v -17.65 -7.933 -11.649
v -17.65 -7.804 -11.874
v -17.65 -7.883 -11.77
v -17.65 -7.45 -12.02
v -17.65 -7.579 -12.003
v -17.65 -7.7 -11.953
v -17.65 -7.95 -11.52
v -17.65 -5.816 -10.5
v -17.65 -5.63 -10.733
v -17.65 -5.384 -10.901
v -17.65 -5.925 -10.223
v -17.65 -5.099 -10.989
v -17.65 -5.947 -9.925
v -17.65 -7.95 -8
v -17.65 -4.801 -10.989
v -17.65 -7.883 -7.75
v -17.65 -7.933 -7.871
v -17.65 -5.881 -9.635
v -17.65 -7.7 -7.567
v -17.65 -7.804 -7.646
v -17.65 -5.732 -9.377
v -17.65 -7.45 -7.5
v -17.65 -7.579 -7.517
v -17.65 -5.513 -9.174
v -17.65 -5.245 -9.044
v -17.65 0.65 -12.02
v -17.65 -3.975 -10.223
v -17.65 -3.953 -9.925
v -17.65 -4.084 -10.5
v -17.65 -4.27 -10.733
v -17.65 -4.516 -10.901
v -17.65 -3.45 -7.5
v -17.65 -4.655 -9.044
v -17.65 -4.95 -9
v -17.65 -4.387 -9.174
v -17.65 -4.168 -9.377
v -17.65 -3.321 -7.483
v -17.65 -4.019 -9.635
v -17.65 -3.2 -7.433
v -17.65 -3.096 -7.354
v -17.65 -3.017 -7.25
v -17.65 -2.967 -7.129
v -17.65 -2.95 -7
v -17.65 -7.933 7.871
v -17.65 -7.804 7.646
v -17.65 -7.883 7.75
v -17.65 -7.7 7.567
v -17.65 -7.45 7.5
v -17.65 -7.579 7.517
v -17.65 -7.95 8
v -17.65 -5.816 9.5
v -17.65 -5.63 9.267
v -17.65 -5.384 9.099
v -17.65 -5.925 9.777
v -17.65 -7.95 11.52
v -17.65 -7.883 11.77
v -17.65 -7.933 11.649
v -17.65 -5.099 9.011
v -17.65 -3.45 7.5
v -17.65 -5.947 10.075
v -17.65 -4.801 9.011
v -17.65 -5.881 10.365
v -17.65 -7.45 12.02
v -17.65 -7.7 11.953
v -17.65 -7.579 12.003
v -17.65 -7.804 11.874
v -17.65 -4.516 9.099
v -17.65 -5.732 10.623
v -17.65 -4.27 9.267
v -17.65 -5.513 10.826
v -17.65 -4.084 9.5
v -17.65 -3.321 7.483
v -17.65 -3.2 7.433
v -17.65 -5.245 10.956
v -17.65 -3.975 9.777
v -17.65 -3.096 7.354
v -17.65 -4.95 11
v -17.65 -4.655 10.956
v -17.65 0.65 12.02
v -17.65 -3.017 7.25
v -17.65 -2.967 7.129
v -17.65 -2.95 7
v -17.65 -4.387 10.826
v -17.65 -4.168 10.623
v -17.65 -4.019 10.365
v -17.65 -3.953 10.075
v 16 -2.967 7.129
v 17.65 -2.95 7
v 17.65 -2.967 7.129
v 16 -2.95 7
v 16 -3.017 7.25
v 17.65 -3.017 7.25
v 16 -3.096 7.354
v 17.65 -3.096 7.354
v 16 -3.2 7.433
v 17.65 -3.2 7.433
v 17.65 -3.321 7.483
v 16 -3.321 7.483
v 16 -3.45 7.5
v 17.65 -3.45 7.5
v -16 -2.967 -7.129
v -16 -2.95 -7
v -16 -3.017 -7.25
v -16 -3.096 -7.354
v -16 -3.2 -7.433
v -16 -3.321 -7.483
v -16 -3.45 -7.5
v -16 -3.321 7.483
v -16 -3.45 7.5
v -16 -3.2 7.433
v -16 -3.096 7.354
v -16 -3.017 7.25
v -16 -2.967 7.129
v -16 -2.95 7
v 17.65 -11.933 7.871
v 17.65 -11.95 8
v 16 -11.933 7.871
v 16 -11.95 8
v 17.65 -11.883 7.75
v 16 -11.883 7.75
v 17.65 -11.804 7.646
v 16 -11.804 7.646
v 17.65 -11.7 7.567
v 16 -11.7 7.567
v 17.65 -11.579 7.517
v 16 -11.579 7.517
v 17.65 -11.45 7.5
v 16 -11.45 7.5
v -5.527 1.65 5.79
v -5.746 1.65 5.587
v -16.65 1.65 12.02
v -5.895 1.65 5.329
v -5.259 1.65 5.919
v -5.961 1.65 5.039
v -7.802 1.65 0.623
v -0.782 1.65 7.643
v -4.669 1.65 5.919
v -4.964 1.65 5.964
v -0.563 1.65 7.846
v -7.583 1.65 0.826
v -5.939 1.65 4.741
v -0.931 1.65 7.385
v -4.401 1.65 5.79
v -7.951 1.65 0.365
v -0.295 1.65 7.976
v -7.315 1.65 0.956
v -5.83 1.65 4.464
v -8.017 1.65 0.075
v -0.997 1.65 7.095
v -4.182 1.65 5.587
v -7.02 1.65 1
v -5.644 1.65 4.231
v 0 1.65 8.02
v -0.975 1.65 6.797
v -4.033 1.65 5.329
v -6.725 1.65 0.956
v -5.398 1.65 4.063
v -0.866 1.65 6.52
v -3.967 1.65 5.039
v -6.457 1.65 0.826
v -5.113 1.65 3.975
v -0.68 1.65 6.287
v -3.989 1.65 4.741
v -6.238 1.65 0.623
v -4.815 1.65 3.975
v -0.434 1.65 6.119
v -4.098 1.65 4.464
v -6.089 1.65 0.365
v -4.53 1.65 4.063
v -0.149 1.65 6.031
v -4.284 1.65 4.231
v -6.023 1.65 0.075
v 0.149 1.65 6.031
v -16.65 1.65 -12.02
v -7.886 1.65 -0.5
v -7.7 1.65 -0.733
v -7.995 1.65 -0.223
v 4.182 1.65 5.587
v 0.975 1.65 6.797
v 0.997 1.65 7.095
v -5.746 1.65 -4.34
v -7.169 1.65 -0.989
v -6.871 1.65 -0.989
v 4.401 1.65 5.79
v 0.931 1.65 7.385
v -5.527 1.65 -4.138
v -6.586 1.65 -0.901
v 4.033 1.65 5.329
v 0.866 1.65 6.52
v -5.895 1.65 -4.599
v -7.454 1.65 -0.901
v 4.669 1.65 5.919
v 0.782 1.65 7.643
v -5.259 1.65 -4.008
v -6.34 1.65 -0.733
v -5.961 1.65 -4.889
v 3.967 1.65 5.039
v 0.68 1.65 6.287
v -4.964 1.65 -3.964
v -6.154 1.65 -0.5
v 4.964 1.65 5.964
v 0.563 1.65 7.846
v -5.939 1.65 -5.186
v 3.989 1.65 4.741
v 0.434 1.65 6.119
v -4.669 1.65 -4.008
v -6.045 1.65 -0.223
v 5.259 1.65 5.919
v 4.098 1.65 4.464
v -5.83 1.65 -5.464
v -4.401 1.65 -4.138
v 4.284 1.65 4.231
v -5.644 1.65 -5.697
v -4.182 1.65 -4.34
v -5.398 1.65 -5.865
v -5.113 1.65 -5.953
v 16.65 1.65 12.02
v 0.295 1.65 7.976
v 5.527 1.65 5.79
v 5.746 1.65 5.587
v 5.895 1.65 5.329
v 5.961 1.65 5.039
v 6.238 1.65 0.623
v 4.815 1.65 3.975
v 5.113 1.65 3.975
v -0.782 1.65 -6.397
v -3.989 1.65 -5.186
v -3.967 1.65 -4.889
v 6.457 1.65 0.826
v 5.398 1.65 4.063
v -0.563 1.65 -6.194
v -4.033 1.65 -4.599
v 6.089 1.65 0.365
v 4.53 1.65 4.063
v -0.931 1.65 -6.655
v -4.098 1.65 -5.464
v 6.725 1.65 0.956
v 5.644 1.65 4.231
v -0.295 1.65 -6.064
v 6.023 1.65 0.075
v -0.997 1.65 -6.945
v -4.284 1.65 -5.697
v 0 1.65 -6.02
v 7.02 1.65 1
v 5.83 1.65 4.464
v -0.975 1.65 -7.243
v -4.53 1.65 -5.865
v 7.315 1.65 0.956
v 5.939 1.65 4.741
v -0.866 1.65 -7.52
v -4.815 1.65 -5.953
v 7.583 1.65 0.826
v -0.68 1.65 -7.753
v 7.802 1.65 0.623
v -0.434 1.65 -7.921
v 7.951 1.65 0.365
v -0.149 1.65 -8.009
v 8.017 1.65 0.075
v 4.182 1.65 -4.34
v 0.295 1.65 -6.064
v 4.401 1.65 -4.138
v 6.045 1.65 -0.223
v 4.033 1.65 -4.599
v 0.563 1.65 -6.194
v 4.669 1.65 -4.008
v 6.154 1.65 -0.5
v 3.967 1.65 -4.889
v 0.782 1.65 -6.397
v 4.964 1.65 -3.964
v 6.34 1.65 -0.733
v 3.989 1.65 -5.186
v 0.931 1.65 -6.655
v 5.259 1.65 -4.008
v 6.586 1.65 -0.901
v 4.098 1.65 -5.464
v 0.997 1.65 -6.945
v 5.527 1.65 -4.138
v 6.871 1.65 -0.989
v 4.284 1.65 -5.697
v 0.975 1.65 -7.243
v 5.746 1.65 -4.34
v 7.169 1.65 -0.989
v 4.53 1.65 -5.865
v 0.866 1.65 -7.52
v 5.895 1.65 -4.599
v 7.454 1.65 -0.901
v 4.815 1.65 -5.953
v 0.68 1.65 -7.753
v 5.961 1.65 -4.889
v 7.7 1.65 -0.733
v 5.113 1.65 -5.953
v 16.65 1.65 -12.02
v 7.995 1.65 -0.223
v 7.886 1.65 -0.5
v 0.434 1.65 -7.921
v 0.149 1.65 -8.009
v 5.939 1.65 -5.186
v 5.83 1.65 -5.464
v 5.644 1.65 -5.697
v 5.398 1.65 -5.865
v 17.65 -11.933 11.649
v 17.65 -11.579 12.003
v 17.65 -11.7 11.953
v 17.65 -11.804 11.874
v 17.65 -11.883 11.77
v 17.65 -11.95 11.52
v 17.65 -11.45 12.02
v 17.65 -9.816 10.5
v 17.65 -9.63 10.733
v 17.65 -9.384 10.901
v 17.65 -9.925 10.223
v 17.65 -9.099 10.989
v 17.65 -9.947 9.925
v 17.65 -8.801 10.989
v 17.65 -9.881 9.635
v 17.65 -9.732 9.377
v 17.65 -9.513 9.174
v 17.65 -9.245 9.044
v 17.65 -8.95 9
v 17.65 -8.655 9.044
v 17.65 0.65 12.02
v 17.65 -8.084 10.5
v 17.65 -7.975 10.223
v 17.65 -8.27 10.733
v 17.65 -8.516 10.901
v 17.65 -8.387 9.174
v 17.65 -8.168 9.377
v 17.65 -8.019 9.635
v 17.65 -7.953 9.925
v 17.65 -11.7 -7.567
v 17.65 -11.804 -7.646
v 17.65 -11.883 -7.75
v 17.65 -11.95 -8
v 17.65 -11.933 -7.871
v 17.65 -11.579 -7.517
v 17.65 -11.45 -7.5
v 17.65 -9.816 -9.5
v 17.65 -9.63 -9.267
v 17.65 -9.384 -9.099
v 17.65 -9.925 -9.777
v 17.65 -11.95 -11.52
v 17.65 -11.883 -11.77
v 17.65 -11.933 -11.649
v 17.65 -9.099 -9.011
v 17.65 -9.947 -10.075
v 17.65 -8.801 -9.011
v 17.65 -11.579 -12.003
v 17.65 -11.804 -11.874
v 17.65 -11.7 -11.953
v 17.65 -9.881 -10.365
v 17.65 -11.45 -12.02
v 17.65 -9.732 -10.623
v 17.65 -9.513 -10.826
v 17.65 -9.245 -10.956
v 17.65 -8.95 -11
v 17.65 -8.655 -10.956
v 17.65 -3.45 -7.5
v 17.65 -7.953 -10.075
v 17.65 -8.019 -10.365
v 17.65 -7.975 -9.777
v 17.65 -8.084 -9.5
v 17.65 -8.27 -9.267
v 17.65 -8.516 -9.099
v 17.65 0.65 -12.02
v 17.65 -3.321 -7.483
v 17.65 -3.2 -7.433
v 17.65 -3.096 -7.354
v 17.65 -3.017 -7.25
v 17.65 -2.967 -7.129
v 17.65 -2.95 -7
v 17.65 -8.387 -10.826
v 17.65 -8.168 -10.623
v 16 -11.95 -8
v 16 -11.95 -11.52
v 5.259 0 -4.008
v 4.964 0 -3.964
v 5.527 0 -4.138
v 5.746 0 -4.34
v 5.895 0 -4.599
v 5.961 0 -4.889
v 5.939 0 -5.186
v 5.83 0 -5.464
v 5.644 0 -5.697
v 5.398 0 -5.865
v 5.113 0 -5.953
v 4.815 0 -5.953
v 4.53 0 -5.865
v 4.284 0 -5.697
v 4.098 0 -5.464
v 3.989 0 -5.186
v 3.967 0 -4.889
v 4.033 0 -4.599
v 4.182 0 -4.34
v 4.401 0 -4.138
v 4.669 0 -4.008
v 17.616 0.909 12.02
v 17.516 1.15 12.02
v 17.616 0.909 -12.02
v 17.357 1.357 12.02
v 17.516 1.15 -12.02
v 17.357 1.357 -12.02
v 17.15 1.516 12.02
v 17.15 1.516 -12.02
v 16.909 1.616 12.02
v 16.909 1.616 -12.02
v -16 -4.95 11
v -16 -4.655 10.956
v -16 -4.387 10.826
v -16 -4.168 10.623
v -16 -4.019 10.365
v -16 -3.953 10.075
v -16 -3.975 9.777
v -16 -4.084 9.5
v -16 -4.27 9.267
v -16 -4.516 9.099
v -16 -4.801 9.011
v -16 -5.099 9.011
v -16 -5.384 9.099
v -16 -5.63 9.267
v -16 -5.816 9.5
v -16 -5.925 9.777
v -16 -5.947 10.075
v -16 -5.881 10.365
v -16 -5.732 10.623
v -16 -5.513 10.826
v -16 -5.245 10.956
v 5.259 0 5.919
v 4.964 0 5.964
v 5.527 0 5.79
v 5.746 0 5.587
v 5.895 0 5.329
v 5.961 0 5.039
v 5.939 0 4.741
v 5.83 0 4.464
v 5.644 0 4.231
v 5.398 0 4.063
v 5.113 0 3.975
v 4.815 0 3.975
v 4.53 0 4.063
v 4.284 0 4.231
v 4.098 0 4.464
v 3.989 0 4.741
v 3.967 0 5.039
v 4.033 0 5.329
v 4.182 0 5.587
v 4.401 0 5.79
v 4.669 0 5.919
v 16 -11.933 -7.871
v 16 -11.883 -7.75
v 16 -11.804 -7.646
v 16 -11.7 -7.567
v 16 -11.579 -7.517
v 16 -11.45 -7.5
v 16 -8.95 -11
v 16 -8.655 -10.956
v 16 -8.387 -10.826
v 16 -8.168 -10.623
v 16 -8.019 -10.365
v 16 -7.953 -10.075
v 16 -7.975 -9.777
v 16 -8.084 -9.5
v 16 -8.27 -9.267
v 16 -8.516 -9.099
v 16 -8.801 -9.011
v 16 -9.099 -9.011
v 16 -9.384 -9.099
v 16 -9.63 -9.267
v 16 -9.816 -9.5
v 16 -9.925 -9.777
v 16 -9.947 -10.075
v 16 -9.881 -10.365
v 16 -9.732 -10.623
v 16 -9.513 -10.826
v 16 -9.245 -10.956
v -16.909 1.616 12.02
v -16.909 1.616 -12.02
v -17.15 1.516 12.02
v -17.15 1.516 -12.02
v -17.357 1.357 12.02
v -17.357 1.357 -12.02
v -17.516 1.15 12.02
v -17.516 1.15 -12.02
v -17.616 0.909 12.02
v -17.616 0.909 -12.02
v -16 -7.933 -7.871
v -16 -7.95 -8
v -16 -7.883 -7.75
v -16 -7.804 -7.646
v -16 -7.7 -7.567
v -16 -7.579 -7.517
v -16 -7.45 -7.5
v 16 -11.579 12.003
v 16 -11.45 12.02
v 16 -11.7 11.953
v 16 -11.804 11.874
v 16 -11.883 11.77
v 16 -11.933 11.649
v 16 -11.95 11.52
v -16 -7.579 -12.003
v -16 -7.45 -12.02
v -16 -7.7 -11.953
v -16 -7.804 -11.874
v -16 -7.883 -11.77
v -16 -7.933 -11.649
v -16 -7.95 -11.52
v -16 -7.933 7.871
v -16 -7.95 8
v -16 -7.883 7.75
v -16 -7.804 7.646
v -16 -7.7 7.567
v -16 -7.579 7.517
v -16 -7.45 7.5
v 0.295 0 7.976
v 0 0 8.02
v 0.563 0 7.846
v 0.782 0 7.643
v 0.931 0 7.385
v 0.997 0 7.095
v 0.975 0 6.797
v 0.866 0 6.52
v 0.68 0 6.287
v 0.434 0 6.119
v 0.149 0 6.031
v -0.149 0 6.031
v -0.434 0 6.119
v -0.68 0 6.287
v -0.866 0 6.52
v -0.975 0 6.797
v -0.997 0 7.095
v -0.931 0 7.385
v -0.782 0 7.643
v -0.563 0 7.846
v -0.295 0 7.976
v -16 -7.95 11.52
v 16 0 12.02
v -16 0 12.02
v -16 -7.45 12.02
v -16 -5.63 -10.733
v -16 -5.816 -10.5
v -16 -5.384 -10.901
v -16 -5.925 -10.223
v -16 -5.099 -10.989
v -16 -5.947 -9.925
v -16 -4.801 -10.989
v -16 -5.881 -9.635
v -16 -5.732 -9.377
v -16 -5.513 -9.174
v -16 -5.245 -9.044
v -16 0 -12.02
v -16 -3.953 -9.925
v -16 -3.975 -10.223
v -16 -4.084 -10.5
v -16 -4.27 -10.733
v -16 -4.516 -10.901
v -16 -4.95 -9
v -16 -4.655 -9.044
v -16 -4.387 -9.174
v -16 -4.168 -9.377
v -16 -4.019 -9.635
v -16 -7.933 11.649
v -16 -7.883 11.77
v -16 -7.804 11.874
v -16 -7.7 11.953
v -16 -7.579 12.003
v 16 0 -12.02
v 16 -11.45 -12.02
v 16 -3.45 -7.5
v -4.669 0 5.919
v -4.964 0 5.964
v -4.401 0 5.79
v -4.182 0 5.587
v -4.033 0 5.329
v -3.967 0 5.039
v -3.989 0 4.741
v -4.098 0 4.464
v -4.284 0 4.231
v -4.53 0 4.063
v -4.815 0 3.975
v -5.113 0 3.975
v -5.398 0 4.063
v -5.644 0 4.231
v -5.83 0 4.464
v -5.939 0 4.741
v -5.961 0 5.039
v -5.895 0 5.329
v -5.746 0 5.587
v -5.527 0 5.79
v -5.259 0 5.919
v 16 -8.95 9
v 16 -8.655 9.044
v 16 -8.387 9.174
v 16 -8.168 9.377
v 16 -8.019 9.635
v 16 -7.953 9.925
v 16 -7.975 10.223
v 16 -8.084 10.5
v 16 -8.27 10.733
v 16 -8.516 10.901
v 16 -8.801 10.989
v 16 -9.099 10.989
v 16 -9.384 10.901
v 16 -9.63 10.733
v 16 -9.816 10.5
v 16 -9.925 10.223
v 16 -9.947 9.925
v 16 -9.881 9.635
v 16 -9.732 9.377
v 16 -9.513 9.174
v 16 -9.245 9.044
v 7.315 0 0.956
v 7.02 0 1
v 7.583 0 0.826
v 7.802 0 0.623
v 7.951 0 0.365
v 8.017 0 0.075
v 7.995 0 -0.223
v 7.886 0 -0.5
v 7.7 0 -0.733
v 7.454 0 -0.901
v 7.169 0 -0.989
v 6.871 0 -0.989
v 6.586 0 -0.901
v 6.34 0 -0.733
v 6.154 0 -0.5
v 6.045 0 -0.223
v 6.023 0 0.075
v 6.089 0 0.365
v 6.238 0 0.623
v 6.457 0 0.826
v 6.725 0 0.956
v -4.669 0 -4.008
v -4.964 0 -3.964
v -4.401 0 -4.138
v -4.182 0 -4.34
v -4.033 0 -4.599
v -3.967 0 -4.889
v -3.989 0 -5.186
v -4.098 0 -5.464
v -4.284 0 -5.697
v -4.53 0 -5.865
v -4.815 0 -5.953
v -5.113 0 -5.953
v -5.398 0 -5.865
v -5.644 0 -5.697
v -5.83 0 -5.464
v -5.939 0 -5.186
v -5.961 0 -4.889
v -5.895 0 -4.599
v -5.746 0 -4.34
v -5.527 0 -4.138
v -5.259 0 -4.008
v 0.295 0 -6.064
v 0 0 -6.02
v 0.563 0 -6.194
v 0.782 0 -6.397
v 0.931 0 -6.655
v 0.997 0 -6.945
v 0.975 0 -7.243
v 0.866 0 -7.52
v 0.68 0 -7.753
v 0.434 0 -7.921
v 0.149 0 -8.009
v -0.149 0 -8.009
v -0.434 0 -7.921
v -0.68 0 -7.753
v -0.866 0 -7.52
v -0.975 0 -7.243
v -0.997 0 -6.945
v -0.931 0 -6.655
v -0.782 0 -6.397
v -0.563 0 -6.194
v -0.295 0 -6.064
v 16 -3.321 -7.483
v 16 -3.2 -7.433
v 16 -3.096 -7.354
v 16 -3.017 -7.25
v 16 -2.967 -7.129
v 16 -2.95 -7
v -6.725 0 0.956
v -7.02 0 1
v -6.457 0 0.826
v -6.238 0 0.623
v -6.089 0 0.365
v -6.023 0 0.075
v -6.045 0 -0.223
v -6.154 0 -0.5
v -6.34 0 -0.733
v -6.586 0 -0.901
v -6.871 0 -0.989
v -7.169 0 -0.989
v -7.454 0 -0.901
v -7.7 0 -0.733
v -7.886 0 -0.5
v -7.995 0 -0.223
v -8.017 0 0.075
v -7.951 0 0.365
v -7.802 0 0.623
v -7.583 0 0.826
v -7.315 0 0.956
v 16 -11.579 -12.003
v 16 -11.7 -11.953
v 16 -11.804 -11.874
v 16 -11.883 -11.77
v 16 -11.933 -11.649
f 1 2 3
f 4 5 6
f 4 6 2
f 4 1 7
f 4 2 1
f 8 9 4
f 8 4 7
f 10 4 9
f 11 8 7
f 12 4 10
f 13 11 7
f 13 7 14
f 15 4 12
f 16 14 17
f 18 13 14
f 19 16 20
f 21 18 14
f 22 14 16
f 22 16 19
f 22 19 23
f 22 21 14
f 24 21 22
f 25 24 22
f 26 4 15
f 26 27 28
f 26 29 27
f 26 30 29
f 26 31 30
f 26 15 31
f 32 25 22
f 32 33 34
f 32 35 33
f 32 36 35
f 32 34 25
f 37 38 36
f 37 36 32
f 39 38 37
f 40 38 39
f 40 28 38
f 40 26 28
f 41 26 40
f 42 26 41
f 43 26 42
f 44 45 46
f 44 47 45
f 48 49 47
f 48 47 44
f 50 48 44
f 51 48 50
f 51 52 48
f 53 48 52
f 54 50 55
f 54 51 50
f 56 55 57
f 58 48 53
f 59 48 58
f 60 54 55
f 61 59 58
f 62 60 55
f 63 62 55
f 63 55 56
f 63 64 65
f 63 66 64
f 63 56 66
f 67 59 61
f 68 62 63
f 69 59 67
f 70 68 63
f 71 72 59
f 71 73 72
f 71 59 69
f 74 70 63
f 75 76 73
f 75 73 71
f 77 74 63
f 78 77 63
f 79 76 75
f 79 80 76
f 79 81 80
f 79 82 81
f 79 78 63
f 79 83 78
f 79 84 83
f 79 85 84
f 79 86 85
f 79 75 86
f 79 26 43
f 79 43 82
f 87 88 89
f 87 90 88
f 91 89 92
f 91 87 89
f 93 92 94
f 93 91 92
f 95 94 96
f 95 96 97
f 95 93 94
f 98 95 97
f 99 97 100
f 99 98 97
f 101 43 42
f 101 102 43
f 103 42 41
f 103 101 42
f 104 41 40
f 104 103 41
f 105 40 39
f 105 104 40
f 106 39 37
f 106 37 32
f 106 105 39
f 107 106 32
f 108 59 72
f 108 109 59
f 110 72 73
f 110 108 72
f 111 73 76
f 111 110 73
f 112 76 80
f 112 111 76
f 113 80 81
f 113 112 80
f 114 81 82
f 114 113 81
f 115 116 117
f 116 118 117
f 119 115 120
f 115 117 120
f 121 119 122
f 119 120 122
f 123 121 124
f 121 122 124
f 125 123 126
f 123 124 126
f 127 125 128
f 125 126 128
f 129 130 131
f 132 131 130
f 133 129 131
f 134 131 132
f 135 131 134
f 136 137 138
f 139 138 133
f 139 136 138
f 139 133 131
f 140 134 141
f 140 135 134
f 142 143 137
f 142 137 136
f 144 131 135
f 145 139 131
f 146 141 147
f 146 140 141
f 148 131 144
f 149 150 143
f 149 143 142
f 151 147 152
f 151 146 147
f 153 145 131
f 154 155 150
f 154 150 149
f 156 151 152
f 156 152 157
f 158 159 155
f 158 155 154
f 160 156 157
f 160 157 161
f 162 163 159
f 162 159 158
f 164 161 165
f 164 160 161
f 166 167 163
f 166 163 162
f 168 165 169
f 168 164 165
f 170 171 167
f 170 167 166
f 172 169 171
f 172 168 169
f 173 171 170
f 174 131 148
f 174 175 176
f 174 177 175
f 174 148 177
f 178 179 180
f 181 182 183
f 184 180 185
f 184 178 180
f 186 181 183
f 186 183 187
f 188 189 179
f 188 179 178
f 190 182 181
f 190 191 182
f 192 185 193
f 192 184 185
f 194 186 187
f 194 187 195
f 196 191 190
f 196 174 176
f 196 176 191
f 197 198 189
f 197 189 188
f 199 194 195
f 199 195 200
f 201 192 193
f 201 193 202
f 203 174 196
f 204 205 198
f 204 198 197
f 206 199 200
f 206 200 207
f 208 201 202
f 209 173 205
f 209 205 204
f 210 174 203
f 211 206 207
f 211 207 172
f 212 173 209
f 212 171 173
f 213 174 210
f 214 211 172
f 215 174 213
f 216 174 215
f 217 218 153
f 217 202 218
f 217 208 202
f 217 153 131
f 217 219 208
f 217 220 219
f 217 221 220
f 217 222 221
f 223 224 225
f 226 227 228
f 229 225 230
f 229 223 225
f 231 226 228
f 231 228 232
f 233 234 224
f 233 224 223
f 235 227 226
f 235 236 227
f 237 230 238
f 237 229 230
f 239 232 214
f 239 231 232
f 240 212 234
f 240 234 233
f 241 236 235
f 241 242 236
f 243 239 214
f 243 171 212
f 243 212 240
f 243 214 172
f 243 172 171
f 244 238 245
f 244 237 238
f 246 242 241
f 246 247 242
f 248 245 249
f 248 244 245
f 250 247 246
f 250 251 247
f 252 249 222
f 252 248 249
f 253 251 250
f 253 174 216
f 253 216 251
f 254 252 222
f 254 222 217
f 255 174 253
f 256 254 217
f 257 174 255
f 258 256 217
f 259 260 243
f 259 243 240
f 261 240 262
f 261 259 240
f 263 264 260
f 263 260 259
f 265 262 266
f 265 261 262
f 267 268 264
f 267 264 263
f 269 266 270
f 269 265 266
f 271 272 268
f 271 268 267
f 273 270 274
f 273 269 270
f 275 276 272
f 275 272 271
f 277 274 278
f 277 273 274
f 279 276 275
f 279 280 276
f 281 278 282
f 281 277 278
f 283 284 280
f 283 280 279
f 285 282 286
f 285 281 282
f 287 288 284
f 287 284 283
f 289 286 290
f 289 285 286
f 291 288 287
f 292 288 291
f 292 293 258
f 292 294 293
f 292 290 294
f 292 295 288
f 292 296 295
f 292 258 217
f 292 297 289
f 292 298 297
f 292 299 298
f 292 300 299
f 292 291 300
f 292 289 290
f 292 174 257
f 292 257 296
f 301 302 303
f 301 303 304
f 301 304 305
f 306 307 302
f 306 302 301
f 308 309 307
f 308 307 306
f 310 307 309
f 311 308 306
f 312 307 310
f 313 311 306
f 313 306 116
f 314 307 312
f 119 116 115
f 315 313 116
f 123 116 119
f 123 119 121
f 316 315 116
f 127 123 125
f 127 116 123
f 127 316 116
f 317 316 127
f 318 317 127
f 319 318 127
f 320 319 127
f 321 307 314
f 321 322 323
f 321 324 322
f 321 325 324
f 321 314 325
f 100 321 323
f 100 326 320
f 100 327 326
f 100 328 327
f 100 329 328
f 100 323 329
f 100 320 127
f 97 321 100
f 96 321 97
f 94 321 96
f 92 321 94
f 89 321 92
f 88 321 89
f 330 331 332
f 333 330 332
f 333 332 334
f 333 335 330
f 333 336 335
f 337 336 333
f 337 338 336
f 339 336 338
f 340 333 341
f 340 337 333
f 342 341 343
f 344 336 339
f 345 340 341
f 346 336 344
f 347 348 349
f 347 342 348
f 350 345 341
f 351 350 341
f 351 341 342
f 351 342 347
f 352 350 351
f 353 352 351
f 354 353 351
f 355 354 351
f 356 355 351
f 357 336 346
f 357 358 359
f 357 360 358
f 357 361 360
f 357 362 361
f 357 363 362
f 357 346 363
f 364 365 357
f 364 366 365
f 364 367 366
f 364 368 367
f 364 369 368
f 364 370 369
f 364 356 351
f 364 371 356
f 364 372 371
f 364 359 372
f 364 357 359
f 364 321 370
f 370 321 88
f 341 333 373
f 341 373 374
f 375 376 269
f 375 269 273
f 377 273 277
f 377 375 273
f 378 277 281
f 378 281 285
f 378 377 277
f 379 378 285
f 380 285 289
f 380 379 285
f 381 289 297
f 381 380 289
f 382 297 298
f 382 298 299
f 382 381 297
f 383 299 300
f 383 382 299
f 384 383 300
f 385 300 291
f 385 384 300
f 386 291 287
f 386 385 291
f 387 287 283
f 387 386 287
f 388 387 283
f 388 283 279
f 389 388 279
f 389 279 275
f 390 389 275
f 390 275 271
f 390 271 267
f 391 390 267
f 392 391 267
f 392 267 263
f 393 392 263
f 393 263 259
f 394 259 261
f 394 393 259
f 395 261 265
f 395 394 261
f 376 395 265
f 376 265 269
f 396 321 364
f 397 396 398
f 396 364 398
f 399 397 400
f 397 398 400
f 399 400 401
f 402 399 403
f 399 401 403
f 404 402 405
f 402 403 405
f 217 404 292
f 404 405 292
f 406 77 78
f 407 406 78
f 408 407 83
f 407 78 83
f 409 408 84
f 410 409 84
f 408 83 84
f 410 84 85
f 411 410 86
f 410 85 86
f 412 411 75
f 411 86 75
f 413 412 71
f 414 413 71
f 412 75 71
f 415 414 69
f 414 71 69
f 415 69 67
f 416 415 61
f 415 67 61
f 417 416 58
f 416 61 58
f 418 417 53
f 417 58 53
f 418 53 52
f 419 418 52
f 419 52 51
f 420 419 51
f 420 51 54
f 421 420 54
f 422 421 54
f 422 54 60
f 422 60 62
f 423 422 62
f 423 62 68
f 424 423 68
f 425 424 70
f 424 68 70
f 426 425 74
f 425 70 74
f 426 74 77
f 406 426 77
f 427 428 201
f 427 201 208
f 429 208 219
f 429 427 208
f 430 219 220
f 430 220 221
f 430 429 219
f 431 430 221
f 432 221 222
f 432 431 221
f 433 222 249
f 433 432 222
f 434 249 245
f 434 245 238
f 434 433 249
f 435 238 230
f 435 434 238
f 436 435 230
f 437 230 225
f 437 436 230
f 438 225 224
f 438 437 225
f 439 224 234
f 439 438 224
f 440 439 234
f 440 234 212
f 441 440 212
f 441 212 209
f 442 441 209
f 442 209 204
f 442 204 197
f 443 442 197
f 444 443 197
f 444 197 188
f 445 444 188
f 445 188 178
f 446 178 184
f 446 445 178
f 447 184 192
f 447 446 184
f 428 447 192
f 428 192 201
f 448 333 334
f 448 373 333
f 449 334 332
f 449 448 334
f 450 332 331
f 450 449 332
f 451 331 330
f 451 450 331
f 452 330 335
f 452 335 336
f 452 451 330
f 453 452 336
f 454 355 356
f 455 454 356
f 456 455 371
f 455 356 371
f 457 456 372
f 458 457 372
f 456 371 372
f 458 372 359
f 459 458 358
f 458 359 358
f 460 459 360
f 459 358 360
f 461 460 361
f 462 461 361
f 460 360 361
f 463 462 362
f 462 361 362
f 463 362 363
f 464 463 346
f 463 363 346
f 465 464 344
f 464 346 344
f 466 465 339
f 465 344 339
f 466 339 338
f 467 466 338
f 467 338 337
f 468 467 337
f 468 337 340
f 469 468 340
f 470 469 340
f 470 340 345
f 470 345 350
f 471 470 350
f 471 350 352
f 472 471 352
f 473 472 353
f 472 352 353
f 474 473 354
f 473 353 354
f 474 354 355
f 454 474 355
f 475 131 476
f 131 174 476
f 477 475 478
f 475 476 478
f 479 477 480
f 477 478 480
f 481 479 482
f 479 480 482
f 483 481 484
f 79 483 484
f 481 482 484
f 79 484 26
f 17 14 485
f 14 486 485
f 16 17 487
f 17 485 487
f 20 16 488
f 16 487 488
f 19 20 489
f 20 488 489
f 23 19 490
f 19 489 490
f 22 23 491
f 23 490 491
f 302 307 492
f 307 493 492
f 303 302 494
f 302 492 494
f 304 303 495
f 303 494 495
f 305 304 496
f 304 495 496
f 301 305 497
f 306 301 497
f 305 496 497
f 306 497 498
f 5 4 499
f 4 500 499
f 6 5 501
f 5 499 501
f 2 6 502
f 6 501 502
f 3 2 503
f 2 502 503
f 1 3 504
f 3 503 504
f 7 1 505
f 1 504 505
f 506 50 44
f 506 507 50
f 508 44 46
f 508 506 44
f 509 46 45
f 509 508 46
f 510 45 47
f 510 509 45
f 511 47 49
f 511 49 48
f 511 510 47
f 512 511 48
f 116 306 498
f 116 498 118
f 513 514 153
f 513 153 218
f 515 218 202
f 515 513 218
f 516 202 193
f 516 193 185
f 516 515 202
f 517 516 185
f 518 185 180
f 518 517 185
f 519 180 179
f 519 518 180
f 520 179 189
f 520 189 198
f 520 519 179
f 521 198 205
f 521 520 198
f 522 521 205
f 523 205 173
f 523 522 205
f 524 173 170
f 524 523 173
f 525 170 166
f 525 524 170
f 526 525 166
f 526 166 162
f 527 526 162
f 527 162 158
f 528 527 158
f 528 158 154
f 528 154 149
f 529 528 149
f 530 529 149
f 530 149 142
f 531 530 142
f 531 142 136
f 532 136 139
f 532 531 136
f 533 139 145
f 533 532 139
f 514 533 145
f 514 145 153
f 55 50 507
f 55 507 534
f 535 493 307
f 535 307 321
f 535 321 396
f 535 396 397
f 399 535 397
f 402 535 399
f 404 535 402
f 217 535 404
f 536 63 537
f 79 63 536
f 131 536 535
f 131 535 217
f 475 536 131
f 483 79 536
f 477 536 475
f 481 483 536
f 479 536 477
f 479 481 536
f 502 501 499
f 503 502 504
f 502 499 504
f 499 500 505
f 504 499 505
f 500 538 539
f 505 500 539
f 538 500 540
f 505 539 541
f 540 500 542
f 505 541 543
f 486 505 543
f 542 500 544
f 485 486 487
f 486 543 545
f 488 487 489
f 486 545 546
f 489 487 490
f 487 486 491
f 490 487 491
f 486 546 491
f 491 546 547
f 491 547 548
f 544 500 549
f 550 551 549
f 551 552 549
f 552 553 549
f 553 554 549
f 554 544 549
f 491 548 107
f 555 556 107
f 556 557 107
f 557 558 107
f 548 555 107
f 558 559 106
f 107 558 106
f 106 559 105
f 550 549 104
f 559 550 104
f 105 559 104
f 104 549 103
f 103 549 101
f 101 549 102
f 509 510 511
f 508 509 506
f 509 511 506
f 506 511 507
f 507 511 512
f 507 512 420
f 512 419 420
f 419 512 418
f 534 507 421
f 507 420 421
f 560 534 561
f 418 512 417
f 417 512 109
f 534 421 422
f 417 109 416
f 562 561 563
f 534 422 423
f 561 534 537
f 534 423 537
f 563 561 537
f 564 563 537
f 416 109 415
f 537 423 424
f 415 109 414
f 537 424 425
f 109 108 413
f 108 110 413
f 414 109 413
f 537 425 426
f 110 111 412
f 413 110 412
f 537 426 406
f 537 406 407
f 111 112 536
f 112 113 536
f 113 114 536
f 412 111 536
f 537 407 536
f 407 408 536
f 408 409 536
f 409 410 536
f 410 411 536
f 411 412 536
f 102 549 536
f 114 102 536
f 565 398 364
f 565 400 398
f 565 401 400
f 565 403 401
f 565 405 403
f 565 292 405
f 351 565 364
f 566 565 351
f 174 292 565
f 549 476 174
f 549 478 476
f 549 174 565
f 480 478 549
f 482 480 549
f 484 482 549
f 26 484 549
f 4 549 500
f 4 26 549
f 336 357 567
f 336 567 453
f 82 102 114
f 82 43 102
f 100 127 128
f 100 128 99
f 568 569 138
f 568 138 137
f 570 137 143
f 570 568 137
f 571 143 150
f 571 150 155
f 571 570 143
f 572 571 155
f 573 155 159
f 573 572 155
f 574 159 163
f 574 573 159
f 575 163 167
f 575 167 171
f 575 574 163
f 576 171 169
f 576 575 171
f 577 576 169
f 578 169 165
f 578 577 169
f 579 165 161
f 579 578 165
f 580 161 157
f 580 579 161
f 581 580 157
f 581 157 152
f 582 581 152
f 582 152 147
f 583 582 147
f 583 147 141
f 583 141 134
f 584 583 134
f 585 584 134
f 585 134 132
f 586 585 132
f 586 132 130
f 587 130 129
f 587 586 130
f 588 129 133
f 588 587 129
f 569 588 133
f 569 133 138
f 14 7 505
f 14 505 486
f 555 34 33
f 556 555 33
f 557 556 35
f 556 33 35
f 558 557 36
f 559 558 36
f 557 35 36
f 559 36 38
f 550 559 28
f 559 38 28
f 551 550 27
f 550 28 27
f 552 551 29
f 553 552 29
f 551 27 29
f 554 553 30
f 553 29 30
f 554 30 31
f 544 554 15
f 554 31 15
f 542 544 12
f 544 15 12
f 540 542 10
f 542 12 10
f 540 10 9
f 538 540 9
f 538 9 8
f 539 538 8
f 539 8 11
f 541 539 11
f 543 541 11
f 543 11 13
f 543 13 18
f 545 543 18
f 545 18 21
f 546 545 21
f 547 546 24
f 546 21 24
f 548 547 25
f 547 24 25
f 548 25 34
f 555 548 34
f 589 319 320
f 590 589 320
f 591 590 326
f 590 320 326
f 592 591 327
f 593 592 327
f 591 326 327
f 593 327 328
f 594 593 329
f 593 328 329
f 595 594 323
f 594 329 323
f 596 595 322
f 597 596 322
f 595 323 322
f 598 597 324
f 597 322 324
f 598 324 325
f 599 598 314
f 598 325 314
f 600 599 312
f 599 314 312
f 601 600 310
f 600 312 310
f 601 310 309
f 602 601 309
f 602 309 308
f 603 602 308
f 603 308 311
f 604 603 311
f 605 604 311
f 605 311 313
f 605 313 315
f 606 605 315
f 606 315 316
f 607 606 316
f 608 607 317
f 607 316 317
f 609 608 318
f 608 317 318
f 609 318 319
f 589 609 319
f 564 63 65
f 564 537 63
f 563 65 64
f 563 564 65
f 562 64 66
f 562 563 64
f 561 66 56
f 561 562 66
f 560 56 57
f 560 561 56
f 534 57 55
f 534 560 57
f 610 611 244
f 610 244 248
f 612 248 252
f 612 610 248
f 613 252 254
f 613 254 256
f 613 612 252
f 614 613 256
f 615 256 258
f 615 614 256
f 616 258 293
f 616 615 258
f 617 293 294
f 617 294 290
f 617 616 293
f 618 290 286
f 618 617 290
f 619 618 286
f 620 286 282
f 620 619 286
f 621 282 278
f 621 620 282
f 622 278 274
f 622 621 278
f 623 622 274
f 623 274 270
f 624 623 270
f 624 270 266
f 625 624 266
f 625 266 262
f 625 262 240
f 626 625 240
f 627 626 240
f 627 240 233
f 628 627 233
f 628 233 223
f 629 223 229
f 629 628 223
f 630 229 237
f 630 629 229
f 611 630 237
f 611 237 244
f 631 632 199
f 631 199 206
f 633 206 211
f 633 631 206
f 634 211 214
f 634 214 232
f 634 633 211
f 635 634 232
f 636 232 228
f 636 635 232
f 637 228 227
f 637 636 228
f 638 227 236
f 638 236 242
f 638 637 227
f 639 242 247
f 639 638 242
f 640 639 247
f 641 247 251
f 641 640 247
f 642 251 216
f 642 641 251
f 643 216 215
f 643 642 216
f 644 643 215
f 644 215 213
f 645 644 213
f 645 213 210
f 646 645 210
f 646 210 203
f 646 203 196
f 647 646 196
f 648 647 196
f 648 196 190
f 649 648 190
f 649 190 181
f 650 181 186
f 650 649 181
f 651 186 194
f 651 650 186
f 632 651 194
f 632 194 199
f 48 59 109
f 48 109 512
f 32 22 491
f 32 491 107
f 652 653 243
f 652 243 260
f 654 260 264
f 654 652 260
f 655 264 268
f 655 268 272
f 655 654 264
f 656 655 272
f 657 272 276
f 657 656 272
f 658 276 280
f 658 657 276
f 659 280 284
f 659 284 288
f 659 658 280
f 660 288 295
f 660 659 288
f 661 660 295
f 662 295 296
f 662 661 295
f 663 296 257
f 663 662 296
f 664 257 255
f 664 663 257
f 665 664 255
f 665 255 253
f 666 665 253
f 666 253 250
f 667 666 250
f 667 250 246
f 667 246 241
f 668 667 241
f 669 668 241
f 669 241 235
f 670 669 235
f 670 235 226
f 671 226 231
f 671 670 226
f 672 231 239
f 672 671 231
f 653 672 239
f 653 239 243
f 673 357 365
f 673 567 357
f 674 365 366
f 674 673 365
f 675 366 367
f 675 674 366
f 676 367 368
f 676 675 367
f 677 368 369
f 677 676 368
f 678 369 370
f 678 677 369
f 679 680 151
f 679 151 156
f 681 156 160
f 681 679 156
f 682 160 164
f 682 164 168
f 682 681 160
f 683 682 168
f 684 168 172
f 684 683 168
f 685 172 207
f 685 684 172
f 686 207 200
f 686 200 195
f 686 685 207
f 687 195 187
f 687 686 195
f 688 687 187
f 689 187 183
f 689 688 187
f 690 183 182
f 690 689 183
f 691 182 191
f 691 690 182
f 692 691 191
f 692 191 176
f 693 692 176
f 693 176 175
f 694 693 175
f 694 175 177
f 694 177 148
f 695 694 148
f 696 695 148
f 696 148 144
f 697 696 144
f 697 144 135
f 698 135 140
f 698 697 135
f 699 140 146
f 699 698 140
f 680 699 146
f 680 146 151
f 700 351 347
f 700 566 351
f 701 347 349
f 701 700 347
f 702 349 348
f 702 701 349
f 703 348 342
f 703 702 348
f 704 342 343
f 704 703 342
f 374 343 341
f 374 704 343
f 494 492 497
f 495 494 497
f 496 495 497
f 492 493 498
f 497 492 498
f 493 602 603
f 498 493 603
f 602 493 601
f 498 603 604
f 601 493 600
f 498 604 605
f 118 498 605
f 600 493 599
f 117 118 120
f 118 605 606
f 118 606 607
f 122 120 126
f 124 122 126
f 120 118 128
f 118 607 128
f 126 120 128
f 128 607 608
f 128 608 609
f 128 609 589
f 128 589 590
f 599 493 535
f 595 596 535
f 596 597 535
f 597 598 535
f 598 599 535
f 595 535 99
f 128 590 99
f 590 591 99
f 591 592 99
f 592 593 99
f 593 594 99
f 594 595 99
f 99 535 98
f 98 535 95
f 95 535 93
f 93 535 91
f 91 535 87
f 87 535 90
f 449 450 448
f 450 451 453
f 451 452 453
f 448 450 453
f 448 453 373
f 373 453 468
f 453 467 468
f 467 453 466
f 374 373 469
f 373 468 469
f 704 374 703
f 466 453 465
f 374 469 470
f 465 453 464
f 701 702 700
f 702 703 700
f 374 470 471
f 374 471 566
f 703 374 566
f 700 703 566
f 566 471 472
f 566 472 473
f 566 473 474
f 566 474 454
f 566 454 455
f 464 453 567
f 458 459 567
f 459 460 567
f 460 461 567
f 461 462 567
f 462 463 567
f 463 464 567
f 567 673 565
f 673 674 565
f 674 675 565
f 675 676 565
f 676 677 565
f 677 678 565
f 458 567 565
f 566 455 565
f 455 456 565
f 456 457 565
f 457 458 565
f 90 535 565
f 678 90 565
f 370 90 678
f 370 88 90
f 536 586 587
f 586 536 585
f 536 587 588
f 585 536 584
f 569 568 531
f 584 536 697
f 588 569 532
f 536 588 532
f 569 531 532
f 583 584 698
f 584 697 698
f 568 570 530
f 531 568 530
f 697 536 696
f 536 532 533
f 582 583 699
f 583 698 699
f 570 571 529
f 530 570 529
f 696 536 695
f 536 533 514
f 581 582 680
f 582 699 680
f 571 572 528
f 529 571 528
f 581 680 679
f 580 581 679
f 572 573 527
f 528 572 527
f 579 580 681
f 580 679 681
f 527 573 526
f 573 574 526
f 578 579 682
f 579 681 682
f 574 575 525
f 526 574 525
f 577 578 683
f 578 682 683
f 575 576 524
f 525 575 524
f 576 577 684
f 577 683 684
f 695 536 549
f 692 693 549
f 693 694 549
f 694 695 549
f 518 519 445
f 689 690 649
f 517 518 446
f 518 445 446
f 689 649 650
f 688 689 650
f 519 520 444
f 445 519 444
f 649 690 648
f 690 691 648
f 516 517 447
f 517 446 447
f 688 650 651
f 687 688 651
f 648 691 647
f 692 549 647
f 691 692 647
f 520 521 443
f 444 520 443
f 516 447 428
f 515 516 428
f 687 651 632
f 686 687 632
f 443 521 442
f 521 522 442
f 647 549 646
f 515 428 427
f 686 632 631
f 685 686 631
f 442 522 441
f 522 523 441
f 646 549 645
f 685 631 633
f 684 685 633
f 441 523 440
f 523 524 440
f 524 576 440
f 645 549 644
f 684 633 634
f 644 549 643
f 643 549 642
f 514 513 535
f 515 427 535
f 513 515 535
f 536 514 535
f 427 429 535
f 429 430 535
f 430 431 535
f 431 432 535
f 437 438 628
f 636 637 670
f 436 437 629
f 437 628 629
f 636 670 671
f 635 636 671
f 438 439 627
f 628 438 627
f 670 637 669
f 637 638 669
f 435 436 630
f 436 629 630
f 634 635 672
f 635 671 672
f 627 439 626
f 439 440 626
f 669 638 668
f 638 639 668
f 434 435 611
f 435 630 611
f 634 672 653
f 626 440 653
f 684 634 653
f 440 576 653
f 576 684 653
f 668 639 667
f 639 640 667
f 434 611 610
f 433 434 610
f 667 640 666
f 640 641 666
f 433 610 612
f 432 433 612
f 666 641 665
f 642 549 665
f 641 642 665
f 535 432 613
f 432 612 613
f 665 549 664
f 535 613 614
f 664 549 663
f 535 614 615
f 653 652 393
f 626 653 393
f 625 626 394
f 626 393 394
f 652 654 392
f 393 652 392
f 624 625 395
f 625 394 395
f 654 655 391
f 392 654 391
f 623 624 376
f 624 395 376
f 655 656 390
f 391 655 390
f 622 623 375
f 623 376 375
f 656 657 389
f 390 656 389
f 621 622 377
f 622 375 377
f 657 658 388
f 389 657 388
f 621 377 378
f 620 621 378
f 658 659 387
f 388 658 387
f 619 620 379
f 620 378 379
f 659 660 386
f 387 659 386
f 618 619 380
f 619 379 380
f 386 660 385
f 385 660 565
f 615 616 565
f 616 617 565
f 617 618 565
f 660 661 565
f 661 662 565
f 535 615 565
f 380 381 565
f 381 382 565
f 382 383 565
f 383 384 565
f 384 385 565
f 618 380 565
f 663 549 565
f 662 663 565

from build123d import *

# Parameters (mm, degrees)
SKETCH1_W           = 35.3
SKETCH1_H           = 24.04
SKETCH1_R           = 1
BOSS_EXTRUDE1_DEPTH = 1.65
SKETCH2_R           = 1
BOSS_EXTRUDE2_DEPTH = 1.65
SKETCH3_R           = 1
BOSS_EXTRUDE3_DEPTH = 1.65
FILLET1_R           = 1
FILLET2_R           = 1
FILLET3_R           = 0.5


with BuildPart() as part:
    # Sketch1 → Boss-Extrude1 (new body)
    with BuildSketch(Plane(origin=(0, 0, 0), x_dir=(1, 0, 0), z_dir=(0, 1, 0))):
        Rectangle(SKETCH1_W, SKETCH1_H)
        with Locations(Location((0, 7.02, 0), (0, 0, 270))):
            Circle(SKETCH1_R, mode=Mode.SUBTRACT)
        with Locations(Location((4.963889604, 4.963889604, 0), (0, 0, 270))):
            Circle(SKETCH1_R, mode=Mode.SUBTRACT)
        with Locations(Location((7.02, 0, 0), (0, 0, 270))):
            Circle(SKETCH1_R, mode=Mode.SUBTRACT)
        with Locations(Location((4.963889604, -4.963889604, 0), (0, 0, 270))):
            Circle(SKETCH1_R, mode=Mode.SUBTRACT)
        with Locations(Location((0, -7.02, 0), (0, 0, 270))):
            Circle(SKETCH1_R, mode=Mode.SUBTRACT)
        with Locations(Location((-4.963889604, -4.963889604, 0), (0, 0, 270))):
            Circle(SKETCH1_R, mode=Mode.SUBTRACT)
        with Locations(Location((-7.02, 0, 0), (0, 0, 270))):
            Circle(SKETCH1_R, mode=Mode.SUBTRACT)
        with Locations(Location((-4.963889604, 4.963889604, 0), (0, 0, 270))):
            Circle(SKETCH1_R, mode=Mode.SUBTRACT)
    extrude(amount=BOSS_EXTRUDE1_DEPTH)

    # Sketch2 → Boss-Extrude2 (add)
    # profile 1 of 2: a face of its own
    with BuildSketch(Plane(origin=(17.65, 0, 0), x_dir=(0, 0, -1), z_dir=(1, 0, 0))):
        Polygon((-7.5, -2.95), (0, -2.95), (0, 0), (-12.02, 0), (-12.02, -11.95), (-7.5, -11.95), align=None)
        with Locations((-10, -8.95)):
            Circle(SKETCH2_R, mode=Mode.SUBTRACT)
    # profile 2 of 2: a face of its own
    with BuildSketch(Plane(origin=(17.65, 0, 0), x_dir=(0, 0, -1), z_dir=(1, 0, 0))):
        Polygon((7.5, -2.95), (7.5, -11.95), (12.02, -11.95), (12.02, 0), (0, 0), (0, -2.95), align=None)
        with Locations((10, -8.95)):
            Circle(SKETCH2_R, mode=Mode.SUBTRACT)
    extrude(amount=-BOSS_EXTRUDE2_DEPTH)

    # Sketch3 → Boss-Extrude3 (add)
    # profile 1 of 2: a face of its own
    with BuildSketch(Plane.ZY.offset(17.65)):
        Polygon((-7.5, -2.95), (0, -2.95), (0, 0), (-12.02, 0), (-12.02, -7.95), (-7.5, -7.95), align=None)
        with Locations((-10, -4.95)):
            Circle(SKETCH3_R, mode=Mode.SUBTRACT)
    # profile 2 of 2: a face of its own
    with BuildSketch(Plane.ZY.offset(17.65)):
        Polygon((7.5, -2.95), (7.5, -7.95), (12.02, -7.95), (12.02, 0), (0, 0), (0, -2.95), align=None)
        with Locations((10, -4.95)):
            Circle(SKETCH3_R, mode=Mode.SUBTRACT)
    extrude(amount=-BOSS_EXTRUDE3_DEPTH)

    # Fillet1
    fillet1_edges = [part.edges().sort_by_distance(p)[0] for p in [
        (17.65, 1.65, 0),
    ]]
    fillet(fillet1_edges, radius=FILLET1_R)

    # Fillet2
    fillet2_edges = [part.edges().sort_by_distance(p)[0] for p in [
        (-17.65, 1.65, 0),
    ]]
    fillet(fillet2_edges, radius=FILLET2_R)

    # Fillet3
    fillet3_edges = [part.edges().sort_by_distance(p)[0] for p in [
        (16.825, -2.95, -7.5),
        (16.825, -2.95, 7.5),
        (16.825, -11.95, 7.5),
        (16.825, -11.95, 12.02),
        (16.825, -11.95, -12.02),
        (16.825, -11.95, -7.5),
        (-16.825, -2.95, 7.5),
        (-16.825, -2.95, -7.5),
        (-16.825, -7.95, -7.5),
        (-16.825, -7.95, -12.02),
        (-16.825, -7.95, 12.02),
        (-16.825, -7.95, 7.5),
    ]]
    fillet(fillet3_edges, radius=FILLET3_R)


solid = part.part
